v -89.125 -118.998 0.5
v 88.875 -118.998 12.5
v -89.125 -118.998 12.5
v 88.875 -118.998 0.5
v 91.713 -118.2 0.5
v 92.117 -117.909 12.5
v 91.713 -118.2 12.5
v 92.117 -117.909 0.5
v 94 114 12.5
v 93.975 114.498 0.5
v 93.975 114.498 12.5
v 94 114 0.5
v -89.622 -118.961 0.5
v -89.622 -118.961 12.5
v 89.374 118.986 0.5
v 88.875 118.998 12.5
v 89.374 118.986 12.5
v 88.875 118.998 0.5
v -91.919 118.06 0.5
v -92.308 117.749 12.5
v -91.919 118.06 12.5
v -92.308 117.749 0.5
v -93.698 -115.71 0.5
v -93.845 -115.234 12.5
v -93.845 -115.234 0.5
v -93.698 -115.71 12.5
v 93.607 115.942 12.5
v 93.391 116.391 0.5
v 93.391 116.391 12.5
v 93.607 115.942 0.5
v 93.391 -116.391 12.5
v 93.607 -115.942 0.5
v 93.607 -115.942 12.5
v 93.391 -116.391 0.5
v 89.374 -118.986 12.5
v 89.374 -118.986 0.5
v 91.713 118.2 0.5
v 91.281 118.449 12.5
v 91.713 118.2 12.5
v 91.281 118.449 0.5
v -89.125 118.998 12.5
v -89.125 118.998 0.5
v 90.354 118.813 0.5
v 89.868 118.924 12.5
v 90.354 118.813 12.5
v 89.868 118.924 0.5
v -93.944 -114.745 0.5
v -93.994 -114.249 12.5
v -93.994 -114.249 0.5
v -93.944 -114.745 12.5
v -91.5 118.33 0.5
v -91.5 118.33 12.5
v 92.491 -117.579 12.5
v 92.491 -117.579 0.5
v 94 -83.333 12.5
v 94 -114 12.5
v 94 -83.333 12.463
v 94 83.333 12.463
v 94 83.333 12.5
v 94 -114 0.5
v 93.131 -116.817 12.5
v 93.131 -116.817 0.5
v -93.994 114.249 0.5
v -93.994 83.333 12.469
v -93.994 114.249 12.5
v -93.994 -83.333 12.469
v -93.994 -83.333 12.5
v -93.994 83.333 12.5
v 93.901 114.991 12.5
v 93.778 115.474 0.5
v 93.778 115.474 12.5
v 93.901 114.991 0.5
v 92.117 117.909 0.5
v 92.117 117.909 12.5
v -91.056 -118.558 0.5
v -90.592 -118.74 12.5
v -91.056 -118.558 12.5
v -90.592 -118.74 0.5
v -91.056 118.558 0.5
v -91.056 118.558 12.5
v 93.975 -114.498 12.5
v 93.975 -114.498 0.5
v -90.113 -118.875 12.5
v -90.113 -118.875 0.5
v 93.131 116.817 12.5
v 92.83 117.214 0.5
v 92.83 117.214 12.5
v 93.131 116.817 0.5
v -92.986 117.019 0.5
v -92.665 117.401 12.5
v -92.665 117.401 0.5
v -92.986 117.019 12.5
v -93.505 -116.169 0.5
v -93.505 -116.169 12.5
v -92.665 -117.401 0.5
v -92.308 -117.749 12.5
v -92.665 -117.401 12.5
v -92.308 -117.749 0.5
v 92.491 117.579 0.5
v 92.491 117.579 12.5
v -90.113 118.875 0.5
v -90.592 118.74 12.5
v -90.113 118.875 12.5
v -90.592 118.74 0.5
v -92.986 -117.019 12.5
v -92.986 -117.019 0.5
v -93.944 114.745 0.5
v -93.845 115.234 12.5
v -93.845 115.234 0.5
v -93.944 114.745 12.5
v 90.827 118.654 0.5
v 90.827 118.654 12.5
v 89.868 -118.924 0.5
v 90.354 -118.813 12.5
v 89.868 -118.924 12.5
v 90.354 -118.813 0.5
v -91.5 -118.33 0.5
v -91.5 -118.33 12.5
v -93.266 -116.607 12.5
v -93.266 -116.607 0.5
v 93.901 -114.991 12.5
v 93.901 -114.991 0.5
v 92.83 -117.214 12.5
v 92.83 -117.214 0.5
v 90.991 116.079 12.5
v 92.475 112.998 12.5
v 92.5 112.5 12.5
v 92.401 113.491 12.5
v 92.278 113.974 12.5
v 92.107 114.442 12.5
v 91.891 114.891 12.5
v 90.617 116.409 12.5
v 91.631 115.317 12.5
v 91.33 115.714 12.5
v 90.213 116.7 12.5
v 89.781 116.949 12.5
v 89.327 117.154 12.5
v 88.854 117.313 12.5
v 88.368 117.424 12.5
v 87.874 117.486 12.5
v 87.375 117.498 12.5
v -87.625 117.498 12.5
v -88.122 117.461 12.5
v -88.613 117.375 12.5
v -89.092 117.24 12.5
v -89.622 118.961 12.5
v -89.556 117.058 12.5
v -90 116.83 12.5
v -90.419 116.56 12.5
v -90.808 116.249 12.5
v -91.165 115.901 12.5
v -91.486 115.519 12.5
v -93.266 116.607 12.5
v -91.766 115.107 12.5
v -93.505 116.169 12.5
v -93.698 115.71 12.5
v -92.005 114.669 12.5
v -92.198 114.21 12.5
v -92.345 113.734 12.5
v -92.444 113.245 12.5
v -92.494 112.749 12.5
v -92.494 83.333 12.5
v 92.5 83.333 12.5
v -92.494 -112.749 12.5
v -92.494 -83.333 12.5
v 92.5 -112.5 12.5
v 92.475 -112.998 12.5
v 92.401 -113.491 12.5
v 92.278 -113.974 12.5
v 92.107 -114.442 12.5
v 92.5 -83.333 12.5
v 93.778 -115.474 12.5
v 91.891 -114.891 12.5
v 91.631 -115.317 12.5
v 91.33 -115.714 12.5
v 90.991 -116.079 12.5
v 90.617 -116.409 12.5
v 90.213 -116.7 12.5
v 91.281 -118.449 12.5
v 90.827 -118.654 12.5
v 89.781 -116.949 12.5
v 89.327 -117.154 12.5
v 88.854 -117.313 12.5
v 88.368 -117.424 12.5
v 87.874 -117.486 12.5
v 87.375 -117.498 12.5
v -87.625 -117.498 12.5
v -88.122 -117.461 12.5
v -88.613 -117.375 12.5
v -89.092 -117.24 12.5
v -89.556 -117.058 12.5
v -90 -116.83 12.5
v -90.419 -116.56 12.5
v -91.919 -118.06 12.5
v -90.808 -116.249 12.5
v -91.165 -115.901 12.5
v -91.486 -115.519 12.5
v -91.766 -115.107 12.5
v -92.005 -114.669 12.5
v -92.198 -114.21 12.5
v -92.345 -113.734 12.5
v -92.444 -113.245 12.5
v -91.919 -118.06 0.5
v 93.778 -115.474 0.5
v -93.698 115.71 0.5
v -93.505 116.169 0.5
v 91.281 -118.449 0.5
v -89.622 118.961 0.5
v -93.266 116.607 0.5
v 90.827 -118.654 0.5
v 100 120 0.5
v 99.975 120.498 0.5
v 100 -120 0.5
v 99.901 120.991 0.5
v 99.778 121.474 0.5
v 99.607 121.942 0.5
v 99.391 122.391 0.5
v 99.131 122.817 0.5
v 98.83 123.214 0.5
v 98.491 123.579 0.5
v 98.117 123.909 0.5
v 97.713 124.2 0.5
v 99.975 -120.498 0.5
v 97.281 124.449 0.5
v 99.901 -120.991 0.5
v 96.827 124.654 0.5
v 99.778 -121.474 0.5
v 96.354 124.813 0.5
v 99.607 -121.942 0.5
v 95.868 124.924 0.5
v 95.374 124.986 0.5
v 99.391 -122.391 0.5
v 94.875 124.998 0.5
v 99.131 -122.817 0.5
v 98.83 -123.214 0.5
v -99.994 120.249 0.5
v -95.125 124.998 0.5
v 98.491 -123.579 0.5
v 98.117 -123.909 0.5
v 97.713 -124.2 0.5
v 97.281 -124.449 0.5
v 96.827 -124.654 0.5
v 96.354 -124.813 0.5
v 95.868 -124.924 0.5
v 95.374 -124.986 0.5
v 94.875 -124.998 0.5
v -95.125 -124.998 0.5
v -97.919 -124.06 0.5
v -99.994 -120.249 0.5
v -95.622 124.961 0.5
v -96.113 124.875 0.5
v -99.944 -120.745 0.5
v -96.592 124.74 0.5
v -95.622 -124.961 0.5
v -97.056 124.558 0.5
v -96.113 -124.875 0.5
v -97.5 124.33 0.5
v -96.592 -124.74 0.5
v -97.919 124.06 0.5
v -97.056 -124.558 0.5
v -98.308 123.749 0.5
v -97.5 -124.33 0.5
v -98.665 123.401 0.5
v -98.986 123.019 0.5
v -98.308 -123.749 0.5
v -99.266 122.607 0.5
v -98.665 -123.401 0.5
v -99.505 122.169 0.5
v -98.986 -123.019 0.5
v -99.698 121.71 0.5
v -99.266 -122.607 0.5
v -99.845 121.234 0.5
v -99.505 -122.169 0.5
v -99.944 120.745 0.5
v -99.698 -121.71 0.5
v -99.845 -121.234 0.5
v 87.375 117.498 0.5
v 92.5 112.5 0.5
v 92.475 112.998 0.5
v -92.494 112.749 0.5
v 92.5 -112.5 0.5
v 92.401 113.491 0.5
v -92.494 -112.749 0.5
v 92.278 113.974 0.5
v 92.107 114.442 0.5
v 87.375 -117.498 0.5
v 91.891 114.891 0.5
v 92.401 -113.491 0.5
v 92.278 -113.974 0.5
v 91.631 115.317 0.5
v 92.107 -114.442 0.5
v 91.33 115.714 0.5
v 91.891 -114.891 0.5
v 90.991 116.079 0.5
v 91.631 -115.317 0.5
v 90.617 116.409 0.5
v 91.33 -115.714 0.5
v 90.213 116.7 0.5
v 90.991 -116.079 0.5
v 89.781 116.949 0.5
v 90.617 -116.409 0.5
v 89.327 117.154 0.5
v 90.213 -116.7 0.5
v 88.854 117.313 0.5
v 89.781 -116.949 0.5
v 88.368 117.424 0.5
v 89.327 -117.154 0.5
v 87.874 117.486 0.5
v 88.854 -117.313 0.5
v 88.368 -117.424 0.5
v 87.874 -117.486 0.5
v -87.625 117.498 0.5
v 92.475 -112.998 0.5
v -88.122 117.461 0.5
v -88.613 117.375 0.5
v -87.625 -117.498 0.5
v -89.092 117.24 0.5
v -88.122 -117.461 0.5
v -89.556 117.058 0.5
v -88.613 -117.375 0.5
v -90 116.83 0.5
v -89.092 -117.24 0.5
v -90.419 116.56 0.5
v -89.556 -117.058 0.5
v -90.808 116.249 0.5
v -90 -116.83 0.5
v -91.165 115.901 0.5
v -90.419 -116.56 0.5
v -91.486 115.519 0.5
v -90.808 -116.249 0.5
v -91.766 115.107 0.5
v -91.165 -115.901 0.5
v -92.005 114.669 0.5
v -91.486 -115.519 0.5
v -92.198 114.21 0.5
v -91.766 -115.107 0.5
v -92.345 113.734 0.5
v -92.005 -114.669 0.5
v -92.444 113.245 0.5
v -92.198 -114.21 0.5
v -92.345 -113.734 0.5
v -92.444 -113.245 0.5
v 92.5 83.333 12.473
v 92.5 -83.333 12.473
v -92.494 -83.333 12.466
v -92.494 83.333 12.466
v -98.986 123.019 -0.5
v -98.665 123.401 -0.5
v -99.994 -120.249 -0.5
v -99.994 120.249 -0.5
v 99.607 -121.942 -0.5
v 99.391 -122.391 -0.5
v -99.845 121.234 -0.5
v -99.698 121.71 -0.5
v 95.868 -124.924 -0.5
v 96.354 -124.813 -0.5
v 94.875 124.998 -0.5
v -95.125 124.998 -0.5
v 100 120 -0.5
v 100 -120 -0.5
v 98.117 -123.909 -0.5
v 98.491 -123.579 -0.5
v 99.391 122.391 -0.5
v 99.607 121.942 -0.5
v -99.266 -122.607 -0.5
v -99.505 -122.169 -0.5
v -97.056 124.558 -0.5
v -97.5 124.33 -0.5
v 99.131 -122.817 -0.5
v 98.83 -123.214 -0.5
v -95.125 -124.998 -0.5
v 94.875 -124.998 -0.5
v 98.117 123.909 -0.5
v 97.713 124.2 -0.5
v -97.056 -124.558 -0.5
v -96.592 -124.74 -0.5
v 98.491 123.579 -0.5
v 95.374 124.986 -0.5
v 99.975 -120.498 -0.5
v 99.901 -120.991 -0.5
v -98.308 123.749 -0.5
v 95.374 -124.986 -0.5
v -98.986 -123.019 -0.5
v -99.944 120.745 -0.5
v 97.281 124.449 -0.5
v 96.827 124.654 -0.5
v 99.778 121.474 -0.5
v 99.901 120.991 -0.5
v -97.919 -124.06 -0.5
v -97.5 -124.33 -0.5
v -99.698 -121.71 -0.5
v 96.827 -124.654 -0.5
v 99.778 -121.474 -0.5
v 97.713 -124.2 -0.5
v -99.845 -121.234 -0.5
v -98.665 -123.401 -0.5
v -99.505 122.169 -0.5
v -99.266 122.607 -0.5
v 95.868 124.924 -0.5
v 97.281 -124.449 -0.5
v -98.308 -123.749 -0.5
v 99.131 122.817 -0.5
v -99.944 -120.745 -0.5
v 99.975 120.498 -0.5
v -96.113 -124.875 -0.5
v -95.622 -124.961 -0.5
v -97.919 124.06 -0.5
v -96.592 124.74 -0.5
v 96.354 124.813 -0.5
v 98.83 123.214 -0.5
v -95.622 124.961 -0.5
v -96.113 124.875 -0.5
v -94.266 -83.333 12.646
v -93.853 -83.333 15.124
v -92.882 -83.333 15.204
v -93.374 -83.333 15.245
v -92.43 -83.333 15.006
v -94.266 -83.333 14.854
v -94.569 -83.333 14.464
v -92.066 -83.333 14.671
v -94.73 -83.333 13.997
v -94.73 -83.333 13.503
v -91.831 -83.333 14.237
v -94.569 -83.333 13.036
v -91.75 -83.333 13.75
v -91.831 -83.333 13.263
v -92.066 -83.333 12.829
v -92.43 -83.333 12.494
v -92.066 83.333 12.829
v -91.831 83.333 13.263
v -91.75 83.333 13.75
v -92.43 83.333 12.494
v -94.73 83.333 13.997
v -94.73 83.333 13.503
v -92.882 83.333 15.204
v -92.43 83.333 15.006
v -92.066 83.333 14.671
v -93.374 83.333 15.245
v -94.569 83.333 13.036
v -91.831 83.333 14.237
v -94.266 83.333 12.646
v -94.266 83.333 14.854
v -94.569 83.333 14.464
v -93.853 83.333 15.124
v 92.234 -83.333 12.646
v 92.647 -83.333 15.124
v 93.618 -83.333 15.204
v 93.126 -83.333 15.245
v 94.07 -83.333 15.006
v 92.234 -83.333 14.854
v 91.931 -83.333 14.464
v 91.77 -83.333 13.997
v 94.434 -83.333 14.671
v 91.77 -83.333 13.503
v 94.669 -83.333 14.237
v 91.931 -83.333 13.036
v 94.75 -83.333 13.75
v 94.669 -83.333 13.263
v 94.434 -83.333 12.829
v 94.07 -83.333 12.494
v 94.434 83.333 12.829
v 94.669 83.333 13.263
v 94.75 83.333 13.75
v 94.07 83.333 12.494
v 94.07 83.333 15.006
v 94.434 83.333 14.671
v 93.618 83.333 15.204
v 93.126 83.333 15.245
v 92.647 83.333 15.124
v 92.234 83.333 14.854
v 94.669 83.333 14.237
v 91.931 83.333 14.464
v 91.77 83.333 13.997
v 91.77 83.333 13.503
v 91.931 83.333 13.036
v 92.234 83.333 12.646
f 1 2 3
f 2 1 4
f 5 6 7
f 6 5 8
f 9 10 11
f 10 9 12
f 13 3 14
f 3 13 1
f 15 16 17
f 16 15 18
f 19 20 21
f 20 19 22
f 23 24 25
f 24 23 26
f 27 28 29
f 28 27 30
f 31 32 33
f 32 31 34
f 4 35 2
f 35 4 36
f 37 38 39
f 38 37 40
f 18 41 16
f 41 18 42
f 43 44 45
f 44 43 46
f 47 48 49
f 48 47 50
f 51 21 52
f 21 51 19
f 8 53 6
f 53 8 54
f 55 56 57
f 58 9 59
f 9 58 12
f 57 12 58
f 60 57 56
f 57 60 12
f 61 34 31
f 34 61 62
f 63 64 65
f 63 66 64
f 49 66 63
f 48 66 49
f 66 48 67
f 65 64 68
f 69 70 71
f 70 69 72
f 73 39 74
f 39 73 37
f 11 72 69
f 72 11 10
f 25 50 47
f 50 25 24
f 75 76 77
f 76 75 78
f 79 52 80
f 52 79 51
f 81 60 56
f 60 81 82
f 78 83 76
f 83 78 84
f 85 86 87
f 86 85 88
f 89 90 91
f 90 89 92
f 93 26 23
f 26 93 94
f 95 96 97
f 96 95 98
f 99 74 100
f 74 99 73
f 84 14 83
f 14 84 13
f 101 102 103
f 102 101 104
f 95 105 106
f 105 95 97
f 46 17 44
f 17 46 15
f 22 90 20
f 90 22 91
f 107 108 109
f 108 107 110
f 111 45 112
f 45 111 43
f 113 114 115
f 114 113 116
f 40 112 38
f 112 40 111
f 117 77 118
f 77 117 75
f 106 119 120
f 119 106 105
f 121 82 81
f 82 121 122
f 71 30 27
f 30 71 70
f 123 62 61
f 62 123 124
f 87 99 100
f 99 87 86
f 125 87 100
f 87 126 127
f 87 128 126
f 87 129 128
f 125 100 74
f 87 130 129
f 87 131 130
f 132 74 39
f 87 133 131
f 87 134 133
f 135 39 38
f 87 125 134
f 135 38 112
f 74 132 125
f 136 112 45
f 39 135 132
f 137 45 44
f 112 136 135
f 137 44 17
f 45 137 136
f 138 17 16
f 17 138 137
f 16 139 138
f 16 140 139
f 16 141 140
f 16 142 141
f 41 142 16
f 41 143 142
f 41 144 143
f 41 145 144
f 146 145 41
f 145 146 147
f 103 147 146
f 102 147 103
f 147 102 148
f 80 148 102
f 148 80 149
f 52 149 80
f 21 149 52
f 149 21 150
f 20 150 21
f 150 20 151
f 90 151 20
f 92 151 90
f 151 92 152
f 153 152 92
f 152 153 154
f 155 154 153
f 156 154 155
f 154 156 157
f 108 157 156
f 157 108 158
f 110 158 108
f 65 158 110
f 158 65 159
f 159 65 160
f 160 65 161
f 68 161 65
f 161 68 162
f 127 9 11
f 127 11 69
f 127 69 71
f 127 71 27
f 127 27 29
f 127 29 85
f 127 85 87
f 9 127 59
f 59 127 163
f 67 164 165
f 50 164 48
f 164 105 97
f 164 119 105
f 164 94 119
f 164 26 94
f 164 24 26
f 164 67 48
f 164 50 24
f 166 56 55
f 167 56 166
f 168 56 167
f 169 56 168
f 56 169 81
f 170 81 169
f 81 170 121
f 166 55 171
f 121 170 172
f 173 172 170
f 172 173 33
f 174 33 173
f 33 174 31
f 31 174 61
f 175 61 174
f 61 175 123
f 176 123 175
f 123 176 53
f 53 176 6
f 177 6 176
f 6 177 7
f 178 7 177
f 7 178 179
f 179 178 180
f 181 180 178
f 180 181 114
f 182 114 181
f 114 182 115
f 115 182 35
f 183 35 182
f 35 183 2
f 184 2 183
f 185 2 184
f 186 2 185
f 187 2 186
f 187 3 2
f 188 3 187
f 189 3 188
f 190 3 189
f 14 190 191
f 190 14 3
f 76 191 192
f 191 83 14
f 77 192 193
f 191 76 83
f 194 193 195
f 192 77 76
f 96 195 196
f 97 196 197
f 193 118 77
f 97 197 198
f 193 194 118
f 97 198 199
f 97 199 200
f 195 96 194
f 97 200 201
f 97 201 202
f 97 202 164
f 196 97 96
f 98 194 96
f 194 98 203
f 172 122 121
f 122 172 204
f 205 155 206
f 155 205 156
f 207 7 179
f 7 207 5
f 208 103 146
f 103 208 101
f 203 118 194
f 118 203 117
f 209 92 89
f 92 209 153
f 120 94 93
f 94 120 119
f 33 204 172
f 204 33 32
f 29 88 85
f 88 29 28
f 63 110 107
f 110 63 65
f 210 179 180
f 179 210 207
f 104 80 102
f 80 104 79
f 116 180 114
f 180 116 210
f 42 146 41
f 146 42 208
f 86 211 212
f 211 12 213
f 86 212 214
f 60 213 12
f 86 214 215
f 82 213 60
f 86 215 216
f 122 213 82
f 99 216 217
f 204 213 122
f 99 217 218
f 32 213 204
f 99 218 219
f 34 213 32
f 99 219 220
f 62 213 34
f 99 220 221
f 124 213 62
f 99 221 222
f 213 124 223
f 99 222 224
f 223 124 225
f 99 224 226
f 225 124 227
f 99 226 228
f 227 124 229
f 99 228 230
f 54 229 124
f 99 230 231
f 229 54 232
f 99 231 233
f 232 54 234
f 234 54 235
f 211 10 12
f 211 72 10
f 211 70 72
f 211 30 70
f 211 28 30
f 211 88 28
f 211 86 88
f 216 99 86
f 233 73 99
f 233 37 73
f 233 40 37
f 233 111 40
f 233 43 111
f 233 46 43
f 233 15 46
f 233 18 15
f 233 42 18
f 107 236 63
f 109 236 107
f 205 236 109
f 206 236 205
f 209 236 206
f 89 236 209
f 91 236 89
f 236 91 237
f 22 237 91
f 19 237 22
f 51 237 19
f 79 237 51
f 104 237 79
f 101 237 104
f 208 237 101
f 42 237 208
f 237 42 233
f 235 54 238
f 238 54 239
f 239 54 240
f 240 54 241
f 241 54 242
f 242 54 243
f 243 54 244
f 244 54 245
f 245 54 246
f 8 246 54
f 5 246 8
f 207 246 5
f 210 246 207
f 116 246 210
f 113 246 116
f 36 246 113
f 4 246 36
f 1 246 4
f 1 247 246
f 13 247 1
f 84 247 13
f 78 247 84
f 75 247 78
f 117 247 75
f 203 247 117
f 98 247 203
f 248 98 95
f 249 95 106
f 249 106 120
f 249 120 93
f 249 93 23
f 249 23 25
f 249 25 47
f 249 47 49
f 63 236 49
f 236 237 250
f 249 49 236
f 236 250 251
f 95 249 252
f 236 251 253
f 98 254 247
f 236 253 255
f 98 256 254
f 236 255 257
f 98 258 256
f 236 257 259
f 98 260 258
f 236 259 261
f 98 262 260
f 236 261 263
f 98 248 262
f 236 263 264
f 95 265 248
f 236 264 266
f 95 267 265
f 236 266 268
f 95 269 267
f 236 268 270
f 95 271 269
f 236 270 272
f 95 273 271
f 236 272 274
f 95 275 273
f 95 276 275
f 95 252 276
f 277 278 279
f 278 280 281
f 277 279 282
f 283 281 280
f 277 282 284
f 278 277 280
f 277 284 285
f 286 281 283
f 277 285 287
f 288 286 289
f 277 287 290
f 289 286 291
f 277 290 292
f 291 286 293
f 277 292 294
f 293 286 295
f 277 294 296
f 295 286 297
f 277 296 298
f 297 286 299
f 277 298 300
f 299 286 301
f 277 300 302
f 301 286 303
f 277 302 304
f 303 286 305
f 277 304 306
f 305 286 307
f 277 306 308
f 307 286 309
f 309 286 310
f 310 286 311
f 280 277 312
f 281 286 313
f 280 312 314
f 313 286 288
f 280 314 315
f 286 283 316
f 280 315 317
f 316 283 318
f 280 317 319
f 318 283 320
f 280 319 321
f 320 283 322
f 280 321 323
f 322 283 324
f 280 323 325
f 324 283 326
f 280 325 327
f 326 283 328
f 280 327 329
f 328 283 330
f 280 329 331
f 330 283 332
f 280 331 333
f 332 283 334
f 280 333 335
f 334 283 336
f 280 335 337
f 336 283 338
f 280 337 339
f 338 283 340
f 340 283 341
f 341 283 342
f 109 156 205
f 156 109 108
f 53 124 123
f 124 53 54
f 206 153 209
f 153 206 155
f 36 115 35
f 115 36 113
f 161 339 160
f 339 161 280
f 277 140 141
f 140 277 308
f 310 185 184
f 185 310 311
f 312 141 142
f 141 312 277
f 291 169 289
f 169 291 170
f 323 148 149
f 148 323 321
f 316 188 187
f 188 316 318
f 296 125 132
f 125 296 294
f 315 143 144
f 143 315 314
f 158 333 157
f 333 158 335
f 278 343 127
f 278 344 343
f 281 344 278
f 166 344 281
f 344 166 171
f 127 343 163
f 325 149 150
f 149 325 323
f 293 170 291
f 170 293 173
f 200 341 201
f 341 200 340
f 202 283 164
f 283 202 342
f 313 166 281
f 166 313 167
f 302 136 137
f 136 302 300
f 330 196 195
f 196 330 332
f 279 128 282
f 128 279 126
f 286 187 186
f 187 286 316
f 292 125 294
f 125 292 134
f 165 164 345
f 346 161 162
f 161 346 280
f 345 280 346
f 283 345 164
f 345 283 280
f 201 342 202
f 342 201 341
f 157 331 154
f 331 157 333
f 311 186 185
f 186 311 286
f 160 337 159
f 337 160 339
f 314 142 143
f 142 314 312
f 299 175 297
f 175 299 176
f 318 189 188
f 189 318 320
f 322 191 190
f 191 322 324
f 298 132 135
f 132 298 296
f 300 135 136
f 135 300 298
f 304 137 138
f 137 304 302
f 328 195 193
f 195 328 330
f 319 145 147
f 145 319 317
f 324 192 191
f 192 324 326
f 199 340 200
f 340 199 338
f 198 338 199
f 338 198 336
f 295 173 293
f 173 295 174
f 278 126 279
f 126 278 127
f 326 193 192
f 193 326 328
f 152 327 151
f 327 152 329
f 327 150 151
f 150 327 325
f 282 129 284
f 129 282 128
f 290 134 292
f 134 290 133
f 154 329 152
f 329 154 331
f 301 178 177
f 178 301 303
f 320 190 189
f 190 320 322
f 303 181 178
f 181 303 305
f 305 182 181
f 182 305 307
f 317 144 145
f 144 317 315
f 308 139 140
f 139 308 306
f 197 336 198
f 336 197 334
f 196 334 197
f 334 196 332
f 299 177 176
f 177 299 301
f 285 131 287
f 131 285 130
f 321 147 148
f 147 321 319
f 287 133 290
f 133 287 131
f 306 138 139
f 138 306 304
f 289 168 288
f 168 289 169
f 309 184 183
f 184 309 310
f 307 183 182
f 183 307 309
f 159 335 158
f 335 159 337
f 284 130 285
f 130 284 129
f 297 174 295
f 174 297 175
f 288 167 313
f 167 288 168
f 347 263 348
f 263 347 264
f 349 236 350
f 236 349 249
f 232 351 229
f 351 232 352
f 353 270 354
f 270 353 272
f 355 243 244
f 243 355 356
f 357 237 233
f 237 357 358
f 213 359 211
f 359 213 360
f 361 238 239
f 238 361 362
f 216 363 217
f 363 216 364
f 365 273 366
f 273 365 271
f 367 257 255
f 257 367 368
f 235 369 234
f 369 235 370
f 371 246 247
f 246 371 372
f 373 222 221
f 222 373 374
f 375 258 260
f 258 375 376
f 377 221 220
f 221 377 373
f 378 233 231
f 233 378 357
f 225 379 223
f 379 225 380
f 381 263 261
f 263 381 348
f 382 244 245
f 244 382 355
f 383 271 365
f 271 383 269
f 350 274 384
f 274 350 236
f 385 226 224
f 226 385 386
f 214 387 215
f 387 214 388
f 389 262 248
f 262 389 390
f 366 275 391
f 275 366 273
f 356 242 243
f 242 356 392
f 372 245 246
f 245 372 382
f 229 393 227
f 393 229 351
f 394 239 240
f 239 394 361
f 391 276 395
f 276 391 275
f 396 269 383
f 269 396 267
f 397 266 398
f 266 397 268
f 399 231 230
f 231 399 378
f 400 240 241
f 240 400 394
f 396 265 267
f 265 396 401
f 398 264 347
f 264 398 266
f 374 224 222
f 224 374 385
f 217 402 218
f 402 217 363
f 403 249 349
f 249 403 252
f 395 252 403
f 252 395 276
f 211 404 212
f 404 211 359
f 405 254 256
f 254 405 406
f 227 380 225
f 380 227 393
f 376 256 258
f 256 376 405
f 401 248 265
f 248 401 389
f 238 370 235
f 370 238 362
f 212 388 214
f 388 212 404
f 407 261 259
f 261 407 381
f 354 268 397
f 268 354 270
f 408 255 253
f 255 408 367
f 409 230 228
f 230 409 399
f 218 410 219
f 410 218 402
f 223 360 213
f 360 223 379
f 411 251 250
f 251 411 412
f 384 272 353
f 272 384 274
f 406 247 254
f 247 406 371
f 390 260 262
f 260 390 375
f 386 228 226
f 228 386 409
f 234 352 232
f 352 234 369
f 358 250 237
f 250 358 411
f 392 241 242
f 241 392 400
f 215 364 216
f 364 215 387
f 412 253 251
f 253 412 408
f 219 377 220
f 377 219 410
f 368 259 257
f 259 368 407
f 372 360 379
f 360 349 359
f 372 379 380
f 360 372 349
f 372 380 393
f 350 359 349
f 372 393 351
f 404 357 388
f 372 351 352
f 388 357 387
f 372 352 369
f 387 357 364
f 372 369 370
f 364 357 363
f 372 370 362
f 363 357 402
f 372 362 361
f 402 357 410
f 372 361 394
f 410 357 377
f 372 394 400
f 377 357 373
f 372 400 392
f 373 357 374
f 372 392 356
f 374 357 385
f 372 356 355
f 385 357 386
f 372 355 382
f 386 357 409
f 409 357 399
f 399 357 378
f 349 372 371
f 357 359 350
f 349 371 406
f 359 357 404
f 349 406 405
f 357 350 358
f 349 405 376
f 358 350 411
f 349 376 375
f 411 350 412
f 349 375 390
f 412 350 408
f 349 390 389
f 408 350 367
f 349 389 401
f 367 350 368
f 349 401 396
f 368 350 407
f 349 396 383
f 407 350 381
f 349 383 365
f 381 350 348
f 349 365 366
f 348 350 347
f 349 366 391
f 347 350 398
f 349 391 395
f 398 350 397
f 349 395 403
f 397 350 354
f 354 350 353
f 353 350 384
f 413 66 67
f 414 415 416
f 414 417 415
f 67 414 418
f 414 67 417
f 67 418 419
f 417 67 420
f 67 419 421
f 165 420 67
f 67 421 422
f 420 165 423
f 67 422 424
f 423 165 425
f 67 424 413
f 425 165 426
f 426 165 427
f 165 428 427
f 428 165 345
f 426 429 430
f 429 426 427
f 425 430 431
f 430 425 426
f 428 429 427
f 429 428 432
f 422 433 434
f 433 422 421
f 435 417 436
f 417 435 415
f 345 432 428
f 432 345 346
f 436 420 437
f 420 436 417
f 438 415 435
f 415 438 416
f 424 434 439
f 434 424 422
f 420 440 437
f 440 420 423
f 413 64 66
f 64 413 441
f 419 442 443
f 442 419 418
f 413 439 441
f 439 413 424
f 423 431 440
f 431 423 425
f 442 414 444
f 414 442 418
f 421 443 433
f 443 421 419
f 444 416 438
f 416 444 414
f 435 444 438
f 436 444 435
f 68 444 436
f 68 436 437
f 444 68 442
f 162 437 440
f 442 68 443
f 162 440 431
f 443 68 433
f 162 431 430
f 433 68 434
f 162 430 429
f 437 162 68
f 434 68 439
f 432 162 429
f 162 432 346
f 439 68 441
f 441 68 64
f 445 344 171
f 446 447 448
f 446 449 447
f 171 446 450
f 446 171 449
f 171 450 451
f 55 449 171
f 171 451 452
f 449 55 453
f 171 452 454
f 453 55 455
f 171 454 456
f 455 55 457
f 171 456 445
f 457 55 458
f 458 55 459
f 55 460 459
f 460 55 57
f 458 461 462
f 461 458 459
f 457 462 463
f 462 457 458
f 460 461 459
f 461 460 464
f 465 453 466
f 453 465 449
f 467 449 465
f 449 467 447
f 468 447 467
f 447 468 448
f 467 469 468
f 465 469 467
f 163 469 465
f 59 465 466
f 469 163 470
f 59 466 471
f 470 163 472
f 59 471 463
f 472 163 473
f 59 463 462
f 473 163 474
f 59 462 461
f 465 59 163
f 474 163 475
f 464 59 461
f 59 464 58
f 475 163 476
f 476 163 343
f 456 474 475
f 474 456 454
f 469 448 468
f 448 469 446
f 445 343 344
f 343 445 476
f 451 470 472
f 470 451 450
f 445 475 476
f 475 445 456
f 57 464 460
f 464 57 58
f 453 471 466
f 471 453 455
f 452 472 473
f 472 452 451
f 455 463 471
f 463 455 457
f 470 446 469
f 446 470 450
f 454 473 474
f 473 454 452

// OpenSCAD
$fa=0.5; // default minimum facet angle is now 0.5
$fs=0.5; // default minimum facet size is now 0.5 mm

//Currently nlength (330.2mm) * sizefactor (0.61515) = 203.123mm (7.997in).
//Currently nwidth (189.69mm) * sizefactor (0/61515) = 116.688mm (4.595in).

// Variables.
botLength    = 250;
botWidth     = 200;
botHeight    = 1;
cornerRadius = 5;

lipOffset    = 12;
lipThickness = 3;
lipHeight    = 12;

// Bottom.
drawBox( botLength, botWidth, botHeight, cornerRadius );

// Lip.
difference()
{
  translate( [ 0, 0, ( botHeight + lipHeight ) / 2 ] )
    color( [ 1, 0, 0 ] ) drawBox( botLength - lipOffset, botWidth - lipOffset, lipHeight, cornerRadius );

  translate( [ 0, 0, ( botHeight + lipHeight ) / 2 ] )
    color( [ 0, 1, 0 ] ) drawBox( botLength - lipOffset - lipThickness, botWidth - lipOffset - lipThickness, lipHeight + 2, cornerRadius );
}

// Flanges.
flangeRadius = 1.5;
flangeX      = ( botWidth - lipOffset - lipThickness / 2 ) / 2;
drawFlange( -flangeX, flangeRadius );
drawFlange(  flangeX, flangeRadius );

module drawBox( length, width, height, cornerRadius )
{
  hull()
  {
    // Upper left rounded edge.
    translate( [ ( width - cornerRadius * 2 ) / 2, ( -length + cornerRadius * 2 ) / 2, -height / 2 ] )
      cylinder( height, cornerRadius, cornerRadius );
    
    // Upper right rounded edge.
    translate( [ ( -width + cornerRadius * 2 ) / 2, ( -length + cornerRadius * 2 ) / 2, -height / 2 ] )
      cylinder( height, cornerRadius, cornerRadius );
    
    // Lower left rounded edge.
    translate( [ ( width - cornerRadius * 2 ) / 2, ( length - cornerRadius * 2 ) / 2, -height / 2 ] )
      cylinder( height, cornerRadius, cornerRadius );
    
    // Lower right rounded edge.
    translate( [ ( -width + cornerRadius * 2 ) / 2, ( length - cornerRadius * 2 ) / 2, -height / 2 ] )
      cylinder( height, cornerRadius, cornerRadius );
  }
}

module drawFlange( position, radius)
{
  rotate( [ -90, 0, 0 ] ) 
    translate( [ position, -( botHeight / 2 + lipHeight + radius - 0.25 ), 0 ] ) 
      cylinder( botLength / 1.5, radius, radius, true );
}
